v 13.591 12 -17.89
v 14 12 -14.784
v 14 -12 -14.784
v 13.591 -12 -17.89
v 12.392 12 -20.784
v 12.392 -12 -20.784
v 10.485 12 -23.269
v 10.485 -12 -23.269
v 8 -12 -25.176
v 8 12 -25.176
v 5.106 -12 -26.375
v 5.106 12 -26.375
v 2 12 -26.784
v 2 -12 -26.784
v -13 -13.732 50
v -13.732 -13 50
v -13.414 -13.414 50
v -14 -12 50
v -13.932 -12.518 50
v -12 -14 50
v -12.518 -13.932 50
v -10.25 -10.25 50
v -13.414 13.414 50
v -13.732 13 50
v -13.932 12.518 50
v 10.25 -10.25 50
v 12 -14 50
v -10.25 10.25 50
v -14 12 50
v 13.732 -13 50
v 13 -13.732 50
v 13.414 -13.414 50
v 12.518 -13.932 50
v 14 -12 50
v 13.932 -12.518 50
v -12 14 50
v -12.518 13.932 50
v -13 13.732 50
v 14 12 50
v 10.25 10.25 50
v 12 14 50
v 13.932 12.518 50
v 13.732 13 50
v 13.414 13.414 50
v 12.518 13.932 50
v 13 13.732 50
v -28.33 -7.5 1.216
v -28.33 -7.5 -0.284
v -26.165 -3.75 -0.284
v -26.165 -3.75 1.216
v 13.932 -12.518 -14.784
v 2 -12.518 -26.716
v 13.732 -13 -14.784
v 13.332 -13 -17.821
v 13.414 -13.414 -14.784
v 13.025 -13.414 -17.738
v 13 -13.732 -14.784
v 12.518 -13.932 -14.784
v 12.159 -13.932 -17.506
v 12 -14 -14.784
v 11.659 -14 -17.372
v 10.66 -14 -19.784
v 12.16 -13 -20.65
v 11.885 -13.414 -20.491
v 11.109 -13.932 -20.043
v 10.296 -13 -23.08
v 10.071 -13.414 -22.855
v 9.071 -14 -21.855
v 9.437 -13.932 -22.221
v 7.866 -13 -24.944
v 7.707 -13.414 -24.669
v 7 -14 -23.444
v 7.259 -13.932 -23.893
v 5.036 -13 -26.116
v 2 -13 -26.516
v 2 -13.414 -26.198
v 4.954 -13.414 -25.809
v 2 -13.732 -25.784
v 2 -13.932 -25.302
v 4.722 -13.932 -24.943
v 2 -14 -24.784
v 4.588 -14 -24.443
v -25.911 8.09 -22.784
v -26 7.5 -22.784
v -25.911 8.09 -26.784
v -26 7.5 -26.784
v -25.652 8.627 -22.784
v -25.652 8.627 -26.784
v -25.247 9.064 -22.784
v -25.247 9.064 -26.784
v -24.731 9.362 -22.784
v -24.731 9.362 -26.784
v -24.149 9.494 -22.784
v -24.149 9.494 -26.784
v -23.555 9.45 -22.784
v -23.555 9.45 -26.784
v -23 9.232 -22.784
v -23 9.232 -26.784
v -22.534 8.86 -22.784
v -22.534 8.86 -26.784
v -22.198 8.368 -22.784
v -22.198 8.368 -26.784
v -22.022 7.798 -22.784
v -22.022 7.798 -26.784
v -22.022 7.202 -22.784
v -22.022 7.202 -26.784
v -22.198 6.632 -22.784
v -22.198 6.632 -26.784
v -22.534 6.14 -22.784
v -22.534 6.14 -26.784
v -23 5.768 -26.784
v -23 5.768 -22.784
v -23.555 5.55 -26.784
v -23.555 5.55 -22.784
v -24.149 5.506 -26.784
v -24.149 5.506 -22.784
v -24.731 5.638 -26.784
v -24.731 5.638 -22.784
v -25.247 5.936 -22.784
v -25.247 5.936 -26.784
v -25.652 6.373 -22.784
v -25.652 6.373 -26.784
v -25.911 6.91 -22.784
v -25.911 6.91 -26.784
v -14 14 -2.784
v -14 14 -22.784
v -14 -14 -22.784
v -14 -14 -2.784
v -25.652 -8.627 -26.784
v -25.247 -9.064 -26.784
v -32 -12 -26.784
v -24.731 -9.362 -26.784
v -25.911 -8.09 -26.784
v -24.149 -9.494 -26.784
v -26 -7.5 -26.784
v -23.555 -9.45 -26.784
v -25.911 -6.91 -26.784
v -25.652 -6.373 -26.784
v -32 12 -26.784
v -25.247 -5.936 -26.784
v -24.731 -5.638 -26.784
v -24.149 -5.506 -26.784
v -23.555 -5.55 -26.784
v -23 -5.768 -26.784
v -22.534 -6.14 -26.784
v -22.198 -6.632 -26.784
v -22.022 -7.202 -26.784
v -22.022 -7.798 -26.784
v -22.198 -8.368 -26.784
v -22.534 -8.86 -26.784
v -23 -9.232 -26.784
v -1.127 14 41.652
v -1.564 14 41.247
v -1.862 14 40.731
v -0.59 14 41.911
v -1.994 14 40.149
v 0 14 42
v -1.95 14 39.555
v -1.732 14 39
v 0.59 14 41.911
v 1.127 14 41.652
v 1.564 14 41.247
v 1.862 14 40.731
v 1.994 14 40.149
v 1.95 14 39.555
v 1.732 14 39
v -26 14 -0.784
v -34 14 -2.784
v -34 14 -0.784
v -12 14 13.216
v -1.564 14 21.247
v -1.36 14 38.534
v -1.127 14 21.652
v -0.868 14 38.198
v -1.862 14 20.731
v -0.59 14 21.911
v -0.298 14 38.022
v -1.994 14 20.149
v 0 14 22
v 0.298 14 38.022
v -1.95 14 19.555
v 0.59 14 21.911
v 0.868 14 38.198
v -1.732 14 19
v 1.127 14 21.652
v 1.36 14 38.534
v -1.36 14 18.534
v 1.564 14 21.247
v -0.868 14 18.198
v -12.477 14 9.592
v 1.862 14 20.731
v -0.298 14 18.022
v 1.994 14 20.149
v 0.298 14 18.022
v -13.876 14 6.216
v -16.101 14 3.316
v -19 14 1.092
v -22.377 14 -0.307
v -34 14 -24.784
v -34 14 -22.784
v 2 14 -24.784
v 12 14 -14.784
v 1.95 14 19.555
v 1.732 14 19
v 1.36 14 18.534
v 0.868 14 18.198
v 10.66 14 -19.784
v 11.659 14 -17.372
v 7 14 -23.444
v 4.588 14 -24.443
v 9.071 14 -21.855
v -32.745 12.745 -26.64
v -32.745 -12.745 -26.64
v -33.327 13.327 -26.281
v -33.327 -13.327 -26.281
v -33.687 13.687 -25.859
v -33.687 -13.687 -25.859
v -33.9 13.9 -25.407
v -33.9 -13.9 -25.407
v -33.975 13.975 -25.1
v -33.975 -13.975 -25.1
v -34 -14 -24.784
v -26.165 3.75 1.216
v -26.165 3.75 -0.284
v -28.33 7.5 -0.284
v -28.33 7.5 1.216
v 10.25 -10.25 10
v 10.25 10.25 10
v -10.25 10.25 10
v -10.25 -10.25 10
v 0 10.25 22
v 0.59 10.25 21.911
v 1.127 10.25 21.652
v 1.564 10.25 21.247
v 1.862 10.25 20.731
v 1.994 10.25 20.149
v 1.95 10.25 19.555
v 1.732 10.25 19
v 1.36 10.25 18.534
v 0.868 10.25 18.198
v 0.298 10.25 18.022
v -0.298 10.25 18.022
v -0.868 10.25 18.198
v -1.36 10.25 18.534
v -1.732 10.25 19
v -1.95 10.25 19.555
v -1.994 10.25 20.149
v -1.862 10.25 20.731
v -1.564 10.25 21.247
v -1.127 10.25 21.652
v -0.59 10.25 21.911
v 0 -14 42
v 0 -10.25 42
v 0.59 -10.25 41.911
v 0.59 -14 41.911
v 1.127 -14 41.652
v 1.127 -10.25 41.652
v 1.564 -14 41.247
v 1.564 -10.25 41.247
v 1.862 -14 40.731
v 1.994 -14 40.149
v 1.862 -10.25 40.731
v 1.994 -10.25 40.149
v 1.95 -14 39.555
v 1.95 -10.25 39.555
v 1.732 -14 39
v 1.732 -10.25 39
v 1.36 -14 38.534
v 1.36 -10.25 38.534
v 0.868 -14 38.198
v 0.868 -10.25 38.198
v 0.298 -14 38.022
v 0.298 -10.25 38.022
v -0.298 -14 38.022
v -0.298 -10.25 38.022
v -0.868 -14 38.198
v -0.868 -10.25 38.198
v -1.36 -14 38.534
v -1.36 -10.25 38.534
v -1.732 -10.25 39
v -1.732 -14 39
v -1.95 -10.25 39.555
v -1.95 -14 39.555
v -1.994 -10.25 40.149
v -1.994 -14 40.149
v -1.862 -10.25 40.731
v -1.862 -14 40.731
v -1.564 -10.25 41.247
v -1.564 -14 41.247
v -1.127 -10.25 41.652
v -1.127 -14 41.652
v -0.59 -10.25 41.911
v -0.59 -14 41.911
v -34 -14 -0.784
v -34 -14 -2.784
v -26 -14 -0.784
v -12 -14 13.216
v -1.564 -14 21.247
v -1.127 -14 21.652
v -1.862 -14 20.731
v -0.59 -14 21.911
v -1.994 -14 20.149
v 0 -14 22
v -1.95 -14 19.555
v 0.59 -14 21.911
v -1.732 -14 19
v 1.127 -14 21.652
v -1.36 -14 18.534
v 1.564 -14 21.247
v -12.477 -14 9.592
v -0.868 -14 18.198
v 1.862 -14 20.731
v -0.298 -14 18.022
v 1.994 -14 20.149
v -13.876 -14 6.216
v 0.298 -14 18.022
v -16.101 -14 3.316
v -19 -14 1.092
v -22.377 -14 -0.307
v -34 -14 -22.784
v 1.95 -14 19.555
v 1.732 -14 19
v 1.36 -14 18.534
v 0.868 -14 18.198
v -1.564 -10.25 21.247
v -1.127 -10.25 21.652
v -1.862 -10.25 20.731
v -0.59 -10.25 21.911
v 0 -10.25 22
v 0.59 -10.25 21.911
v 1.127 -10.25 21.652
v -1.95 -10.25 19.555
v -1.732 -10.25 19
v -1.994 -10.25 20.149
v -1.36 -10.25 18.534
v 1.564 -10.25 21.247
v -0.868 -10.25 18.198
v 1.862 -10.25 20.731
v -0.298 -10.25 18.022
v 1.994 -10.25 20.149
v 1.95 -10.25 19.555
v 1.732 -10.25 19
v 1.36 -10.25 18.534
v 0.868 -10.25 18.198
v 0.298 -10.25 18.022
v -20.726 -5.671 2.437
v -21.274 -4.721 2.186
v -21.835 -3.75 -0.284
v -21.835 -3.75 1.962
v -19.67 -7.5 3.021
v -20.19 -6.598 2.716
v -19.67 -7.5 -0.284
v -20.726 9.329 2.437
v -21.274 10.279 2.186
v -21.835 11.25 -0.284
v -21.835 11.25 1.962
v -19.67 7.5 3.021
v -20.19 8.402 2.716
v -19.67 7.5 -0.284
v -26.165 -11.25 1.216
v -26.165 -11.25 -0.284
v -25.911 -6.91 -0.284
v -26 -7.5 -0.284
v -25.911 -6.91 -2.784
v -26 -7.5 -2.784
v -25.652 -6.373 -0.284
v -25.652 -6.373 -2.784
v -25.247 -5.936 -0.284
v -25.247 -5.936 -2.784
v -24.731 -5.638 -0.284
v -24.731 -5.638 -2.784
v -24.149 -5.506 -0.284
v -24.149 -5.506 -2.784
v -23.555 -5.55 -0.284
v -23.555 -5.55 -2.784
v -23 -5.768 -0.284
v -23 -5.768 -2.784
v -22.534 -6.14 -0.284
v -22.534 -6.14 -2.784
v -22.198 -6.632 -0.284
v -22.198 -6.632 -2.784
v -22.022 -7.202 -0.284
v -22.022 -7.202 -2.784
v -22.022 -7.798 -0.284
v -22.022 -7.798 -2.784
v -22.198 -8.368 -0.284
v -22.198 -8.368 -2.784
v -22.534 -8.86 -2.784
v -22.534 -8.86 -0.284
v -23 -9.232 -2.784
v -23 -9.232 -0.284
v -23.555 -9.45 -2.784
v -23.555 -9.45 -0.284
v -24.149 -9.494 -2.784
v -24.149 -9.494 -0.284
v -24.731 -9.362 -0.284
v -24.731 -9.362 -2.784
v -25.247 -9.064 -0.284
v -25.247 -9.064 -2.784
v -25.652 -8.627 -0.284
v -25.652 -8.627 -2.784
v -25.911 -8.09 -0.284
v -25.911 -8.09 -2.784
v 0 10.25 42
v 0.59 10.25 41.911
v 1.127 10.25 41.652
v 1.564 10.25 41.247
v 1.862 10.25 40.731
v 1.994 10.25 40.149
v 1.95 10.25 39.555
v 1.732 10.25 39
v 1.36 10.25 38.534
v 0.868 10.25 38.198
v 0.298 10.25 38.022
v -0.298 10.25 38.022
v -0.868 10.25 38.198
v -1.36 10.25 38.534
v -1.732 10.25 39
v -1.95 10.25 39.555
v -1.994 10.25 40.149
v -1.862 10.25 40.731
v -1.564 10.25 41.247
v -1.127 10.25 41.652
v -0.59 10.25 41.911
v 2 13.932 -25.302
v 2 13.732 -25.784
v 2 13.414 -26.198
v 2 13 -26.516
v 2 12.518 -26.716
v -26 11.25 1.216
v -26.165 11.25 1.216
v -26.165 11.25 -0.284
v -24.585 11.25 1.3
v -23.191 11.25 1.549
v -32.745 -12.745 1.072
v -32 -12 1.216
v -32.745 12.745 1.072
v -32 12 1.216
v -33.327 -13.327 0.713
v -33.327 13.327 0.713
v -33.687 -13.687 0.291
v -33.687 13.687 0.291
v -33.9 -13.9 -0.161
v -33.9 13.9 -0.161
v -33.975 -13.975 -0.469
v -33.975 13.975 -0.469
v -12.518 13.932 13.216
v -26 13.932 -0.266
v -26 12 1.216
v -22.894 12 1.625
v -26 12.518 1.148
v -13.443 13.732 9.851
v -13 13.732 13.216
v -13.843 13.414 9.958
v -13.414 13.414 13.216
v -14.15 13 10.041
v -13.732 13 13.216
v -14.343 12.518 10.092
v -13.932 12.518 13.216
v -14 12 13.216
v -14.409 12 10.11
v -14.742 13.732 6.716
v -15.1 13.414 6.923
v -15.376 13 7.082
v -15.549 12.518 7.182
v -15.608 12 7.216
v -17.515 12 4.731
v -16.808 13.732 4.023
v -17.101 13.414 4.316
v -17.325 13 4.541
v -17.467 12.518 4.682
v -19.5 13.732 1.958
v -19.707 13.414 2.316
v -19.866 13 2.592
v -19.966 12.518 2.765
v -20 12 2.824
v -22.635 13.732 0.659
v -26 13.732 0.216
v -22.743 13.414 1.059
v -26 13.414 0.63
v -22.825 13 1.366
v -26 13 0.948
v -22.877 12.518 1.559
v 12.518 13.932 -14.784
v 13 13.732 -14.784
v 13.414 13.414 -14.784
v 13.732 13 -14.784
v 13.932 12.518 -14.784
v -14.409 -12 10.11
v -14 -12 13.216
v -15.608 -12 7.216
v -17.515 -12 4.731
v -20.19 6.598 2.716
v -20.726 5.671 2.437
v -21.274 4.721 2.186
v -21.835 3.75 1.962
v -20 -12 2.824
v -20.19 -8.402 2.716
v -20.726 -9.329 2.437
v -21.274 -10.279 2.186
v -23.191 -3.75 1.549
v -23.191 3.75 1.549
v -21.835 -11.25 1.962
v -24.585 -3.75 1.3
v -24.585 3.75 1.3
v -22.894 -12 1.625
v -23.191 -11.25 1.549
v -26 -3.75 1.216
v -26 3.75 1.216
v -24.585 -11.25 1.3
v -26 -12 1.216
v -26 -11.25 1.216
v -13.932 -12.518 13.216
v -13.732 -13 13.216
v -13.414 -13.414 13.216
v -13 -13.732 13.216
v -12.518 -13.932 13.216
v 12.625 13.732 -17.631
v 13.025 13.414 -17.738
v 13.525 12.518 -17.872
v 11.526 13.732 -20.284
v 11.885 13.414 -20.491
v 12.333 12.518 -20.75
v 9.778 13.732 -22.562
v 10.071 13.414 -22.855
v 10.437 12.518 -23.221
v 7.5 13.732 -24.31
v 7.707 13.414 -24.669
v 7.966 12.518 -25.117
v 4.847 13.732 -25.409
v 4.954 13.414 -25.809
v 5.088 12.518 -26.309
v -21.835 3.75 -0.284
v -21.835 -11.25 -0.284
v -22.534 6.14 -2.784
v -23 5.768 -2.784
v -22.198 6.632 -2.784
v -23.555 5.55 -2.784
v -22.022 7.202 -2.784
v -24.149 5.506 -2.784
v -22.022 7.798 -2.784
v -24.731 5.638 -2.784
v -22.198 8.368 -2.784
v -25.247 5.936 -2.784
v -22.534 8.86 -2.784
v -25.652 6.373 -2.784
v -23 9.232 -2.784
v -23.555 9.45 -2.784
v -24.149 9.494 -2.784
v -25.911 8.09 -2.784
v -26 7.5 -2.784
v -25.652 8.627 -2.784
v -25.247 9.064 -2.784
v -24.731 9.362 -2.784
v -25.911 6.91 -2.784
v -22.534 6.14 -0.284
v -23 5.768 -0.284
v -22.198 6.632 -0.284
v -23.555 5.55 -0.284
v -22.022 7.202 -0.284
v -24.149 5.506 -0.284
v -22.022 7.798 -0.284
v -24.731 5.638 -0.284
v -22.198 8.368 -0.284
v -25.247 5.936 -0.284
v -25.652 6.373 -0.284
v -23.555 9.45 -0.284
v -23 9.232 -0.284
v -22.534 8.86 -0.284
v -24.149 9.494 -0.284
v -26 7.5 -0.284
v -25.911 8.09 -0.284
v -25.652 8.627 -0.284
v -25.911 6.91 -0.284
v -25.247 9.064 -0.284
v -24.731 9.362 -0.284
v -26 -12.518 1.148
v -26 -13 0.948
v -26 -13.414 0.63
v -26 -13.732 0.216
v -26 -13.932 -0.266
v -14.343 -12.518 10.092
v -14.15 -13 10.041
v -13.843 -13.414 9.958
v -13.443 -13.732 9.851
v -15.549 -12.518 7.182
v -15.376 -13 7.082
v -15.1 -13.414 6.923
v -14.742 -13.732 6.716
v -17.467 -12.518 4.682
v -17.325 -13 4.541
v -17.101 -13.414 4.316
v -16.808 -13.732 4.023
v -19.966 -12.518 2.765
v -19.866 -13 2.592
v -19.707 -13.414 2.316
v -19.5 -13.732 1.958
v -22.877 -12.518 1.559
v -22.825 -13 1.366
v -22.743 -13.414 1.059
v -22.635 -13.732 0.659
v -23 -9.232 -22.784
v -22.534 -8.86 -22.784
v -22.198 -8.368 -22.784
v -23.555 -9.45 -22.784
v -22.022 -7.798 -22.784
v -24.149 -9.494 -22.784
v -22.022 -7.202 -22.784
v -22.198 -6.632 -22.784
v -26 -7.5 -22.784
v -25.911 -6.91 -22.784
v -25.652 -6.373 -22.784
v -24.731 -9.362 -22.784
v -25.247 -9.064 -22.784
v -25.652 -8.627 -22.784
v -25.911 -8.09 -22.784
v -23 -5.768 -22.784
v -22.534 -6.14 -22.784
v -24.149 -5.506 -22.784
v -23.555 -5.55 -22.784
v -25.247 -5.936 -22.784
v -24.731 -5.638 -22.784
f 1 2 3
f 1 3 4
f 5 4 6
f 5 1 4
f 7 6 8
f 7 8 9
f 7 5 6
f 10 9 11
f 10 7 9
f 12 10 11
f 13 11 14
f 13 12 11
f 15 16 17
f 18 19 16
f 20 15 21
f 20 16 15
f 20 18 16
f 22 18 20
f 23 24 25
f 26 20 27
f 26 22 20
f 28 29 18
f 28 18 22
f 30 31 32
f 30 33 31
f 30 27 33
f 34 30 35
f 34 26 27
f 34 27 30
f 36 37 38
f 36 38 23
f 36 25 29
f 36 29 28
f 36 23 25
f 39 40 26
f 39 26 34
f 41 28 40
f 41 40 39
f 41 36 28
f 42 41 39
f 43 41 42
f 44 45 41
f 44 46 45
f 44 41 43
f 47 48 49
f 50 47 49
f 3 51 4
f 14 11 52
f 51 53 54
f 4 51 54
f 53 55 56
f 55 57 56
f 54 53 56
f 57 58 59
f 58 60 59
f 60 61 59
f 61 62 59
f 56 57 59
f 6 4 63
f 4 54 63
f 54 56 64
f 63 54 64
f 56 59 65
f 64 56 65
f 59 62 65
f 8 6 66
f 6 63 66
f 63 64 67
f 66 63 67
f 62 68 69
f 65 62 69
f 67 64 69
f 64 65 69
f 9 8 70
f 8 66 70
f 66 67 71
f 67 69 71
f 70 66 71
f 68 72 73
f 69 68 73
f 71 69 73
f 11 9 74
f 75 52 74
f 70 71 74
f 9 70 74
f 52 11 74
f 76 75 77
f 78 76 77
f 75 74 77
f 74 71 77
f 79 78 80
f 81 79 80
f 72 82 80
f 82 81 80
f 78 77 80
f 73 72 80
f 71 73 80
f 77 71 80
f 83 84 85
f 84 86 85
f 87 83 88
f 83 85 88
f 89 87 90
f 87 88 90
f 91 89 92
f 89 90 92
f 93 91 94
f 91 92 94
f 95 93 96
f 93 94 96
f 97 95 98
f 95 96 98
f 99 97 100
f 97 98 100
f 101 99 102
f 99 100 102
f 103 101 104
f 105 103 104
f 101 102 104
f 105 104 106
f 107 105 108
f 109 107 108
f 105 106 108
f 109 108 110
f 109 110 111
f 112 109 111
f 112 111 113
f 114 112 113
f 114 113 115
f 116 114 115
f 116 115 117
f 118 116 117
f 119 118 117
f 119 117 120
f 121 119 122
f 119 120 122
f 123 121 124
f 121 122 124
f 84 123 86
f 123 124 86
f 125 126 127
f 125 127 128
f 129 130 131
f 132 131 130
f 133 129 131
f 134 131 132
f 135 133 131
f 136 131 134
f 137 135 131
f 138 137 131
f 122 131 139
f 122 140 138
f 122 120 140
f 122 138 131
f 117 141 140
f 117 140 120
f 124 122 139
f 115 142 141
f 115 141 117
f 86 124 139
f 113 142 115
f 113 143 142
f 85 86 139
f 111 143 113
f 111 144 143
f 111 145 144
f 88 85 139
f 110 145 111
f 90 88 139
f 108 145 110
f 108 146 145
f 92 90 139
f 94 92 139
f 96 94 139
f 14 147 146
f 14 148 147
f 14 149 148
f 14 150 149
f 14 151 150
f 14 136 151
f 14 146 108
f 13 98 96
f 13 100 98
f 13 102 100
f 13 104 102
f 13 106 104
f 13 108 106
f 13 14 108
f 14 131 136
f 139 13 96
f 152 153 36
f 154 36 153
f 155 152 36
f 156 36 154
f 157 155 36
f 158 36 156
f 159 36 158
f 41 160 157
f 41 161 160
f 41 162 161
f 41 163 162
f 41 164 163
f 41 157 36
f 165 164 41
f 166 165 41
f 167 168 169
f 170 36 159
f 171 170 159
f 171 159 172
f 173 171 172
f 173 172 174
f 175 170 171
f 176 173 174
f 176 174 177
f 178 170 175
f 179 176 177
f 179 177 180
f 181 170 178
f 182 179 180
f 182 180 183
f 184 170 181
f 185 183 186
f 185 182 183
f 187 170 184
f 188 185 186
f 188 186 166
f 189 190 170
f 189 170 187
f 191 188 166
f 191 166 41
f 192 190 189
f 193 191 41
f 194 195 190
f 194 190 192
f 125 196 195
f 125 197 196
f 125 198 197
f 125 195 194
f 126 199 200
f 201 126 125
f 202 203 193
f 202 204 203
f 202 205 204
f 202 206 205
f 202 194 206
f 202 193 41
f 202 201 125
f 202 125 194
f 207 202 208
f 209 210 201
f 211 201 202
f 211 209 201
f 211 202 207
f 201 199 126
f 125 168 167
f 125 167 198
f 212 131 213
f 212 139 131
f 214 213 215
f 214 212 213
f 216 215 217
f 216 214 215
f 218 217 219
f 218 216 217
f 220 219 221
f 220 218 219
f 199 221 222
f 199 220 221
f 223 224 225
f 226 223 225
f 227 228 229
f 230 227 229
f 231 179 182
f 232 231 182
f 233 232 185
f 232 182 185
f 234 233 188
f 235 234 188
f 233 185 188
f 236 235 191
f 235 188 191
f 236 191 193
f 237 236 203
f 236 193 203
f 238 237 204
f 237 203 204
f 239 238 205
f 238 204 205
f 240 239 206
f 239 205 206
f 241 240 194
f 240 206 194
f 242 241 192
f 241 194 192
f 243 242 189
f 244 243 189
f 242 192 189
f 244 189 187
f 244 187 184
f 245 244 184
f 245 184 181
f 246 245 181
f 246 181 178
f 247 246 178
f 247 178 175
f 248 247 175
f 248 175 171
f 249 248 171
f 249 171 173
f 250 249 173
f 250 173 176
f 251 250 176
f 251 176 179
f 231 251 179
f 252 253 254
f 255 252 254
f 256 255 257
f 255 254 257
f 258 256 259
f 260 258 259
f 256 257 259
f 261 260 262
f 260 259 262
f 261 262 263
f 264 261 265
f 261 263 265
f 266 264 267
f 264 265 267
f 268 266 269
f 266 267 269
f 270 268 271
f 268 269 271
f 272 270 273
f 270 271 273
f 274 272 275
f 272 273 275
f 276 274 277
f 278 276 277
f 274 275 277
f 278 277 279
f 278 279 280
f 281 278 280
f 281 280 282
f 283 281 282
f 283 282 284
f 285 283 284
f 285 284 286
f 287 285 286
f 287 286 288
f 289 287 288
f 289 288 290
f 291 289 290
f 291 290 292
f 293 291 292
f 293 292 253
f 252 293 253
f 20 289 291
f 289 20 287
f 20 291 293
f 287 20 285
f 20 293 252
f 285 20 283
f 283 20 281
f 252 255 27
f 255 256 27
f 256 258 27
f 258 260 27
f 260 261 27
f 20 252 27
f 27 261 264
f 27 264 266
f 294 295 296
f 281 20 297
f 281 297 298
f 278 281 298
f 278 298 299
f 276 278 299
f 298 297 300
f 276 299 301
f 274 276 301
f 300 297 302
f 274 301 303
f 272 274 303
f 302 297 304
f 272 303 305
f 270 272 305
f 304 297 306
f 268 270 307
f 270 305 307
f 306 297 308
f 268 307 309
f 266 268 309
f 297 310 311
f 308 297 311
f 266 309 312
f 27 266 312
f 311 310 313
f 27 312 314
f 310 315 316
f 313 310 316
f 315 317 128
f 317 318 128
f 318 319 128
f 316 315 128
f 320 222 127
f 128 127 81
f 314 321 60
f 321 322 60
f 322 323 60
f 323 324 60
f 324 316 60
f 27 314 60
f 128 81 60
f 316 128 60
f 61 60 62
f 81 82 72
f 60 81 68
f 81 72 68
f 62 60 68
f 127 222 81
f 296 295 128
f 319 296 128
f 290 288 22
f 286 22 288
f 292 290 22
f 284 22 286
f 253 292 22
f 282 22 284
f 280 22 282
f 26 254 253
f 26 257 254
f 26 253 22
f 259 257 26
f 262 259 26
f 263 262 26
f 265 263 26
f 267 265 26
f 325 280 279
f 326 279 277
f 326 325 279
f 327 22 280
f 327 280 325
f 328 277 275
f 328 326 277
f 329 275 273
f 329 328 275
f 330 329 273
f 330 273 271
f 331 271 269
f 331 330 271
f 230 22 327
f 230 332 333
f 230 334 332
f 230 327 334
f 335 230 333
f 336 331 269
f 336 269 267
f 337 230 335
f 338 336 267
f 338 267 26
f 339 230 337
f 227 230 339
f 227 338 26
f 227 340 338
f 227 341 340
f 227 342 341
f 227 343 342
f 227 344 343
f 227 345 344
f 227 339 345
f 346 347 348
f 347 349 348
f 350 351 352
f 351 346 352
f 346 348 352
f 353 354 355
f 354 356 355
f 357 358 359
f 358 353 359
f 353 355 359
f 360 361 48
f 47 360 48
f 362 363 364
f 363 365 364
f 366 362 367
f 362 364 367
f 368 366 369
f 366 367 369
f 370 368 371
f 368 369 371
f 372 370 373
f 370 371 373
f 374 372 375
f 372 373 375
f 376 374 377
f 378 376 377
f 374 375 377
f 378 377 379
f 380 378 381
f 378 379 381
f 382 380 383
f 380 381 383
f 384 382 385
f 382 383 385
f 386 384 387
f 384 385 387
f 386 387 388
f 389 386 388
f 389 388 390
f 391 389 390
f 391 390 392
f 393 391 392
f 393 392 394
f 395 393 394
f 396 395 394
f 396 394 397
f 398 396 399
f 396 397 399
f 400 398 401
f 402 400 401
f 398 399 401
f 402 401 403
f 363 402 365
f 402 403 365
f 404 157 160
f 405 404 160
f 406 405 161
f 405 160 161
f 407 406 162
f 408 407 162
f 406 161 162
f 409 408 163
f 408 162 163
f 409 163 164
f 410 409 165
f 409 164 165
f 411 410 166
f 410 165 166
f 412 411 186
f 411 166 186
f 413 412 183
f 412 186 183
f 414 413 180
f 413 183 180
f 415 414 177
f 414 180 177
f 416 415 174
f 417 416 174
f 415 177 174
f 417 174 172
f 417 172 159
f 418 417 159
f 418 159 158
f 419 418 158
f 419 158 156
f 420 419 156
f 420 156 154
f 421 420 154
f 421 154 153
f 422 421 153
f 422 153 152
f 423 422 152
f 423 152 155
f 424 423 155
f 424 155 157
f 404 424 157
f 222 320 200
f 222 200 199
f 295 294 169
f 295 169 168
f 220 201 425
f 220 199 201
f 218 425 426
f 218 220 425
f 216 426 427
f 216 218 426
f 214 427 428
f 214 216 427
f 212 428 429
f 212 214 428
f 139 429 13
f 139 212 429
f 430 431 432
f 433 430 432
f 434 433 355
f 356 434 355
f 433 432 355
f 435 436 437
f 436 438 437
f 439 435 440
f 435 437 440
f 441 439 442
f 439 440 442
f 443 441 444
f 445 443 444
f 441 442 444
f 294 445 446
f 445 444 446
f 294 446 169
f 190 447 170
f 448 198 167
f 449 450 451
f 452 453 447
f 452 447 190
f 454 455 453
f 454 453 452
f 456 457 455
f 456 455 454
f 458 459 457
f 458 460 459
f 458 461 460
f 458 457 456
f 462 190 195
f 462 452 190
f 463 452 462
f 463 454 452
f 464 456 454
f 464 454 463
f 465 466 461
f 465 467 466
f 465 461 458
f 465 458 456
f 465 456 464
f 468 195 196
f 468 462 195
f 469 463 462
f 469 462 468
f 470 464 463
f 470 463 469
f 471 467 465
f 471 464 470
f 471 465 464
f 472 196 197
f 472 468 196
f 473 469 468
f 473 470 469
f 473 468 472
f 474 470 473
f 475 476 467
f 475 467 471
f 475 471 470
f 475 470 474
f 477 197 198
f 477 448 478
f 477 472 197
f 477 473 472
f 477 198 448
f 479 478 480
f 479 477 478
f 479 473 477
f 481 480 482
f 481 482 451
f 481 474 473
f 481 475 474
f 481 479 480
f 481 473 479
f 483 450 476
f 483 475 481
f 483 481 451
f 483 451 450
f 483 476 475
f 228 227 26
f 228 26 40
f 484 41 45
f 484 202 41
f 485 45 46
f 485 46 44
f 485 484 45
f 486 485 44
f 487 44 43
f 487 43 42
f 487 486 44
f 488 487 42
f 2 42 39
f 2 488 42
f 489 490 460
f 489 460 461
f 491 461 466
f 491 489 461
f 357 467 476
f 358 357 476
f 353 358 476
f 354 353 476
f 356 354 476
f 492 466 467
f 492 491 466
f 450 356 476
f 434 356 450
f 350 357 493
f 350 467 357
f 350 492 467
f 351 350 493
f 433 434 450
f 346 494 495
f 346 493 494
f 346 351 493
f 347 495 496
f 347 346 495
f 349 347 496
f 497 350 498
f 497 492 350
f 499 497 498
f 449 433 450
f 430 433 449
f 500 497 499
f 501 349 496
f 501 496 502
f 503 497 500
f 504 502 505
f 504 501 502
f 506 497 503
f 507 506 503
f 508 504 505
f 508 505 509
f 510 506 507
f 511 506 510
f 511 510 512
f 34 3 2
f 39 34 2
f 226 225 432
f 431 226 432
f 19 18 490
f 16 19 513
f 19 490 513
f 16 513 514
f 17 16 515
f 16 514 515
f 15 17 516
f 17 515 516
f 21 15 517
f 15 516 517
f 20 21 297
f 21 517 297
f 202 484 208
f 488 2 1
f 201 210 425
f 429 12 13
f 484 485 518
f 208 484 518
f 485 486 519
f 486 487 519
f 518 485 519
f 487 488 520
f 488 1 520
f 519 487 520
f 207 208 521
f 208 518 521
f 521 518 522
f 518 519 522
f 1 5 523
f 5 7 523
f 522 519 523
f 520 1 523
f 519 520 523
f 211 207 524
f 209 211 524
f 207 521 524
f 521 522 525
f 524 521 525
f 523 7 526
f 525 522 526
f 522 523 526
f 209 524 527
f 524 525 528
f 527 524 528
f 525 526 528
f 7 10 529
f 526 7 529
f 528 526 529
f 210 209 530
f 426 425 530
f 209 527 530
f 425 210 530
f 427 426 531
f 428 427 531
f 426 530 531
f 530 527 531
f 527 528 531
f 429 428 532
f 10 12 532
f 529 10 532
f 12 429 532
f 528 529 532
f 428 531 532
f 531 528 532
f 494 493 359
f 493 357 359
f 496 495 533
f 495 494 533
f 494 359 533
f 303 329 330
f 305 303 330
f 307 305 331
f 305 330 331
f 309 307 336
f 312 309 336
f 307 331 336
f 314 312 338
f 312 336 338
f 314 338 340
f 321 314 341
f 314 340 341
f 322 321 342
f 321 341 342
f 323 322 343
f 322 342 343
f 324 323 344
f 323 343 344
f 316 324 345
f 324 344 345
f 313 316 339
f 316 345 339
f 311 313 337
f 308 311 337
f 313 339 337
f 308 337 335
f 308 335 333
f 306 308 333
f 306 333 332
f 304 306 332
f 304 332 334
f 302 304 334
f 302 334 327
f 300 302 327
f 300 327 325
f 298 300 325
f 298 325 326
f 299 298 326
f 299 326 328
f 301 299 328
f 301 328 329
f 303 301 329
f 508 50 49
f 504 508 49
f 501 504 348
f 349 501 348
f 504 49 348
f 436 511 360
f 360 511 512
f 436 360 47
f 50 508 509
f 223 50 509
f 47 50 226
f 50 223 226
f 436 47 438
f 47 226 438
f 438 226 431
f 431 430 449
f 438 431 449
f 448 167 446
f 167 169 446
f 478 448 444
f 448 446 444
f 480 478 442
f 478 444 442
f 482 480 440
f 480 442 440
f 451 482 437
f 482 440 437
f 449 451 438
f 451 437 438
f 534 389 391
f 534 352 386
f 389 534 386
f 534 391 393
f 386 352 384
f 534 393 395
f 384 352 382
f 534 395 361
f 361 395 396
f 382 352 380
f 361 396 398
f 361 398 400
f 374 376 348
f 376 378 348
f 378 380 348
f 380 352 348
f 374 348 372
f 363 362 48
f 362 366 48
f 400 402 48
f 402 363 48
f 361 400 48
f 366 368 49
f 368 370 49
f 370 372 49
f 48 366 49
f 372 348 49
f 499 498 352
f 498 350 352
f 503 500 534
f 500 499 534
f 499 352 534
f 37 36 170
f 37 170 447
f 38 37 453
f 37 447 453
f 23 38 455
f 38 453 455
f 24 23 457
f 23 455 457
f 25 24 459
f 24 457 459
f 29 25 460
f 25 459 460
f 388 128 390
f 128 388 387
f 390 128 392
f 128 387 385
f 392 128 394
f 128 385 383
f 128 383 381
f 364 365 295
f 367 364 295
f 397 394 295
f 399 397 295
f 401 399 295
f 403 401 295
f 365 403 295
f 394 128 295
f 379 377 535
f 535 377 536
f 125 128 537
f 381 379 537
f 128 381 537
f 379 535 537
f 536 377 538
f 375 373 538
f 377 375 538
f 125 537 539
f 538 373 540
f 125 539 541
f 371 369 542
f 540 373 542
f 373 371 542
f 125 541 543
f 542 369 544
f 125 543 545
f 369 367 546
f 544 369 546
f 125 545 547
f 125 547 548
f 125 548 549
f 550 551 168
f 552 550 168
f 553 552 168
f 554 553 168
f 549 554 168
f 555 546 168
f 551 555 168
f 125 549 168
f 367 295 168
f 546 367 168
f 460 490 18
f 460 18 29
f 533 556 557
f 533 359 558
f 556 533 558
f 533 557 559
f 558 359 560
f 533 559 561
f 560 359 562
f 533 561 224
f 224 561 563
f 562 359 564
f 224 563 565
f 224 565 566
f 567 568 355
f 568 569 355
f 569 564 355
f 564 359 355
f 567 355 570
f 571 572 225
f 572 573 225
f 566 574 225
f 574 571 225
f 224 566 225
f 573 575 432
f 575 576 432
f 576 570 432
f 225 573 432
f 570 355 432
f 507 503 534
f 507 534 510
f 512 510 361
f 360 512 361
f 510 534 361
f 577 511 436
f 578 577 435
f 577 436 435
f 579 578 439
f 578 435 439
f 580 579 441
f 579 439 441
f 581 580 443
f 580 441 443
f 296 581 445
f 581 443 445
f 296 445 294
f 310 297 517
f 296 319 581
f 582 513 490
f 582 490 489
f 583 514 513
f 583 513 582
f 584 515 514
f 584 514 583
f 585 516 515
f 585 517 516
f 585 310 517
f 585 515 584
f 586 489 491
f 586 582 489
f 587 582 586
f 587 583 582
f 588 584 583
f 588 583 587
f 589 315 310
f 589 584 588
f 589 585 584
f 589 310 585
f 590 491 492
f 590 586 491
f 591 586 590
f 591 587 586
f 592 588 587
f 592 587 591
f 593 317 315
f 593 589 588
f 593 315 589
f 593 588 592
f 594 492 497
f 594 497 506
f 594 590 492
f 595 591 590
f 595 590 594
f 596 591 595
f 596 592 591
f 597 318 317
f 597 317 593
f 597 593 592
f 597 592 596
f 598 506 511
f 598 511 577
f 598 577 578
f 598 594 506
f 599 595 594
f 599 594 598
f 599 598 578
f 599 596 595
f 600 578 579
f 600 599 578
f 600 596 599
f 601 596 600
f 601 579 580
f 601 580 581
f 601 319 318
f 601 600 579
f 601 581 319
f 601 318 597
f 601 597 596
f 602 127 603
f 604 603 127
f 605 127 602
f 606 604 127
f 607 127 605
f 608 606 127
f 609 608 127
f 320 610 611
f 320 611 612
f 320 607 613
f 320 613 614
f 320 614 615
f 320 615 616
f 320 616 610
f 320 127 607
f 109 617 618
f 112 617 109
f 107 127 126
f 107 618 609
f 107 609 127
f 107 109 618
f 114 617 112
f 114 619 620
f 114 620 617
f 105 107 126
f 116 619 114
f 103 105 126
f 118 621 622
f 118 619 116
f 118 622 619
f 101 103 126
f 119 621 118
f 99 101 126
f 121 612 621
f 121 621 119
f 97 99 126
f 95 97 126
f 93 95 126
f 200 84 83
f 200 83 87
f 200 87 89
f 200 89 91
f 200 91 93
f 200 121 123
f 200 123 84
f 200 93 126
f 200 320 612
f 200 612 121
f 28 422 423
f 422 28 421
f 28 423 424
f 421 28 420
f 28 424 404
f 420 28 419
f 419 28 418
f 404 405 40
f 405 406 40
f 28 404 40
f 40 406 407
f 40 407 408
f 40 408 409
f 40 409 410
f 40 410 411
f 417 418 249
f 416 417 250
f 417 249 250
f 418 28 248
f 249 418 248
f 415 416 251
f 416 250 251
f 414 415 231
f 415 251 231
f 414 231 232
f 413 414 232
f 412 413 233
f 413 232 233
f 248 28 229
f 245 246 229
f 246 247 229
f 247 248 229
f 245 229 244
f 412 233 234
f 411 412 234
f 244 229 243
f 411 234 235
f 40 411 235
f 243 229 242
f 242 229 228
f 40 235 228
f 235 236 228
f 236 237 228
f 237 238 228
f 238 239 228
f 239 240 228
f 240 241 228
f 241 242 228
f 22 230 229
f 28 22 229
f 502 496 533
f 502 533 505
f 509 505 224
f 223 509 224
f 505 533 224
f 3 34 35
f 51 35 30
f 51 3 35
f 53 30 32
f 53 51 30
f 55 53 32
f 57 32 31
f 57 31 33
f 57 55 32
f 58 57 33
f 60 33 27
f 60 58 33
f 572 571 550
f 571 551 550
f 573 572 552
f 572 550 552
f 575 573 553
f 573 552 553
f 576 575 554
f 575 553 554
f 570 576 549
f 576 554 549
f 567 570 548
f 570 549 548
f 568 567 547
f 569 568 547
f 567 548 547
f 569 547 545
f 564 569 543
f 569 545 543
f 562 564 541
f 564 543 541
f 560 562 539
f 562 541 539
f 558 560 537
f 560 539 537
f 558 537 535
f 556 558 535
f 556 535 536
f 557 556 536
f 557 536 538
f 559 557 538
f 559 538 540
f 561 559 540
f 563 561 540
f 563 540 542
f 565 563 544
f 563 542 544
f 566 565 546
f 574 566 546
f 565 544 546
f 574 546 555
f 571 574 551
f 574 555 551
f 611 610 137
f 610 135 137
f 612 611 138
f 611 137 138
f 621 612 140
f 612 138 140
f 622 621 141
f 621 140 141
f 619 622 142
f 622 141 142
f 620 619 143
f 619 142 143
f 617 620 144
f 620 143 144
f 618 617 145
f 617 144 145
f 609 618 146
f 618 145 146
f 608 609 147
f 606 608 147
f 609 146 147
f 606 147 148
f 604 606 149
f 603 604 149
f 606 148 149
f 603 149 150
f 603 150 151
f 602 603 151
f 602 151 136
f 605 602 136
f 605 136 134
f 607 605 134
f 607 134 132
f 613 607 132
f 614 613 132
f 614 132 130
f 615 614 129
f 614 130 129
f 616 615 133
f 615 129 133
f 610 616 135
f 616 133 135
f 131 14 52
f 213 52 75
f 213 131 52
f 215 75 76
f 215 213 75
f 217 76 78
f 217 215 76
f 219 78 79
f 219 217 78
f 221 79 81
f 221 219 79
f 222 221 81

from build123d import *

# Parameters (mm, degrees)
SKETCH_1_W          = 28
SKETCH_1_H          = 28
SKETCH_1_W_2        = 20.5
SKETCH_1_H_2        = 20.5
EXTRUDE_1_DEPTH     = 50
SKETCH_2_W          = 28
SKETCH_2_H          = 28
EXTRUDE_2_DEPTH     = 10
SKETCH_7_W          = 28
SKETCH_7_H          = 28
EXTRUDE_4_DEPTH     = 48
SKETCH_8_W          = 20
SKETCH_8_H          = 28
CUT_EXTRUDE_4_DEPTH = 20
FILLET_4_R          = 12
FILLET_6_R          = 2
SKETCH_9_R          = 2
CUT_EXTRUDE_5_DEPTH = 86.134031464
CUT_EXTRUDE_START   = -26.5
CUT_EXTRUDE_6_DEPTH = 59.634031464
SKETCH_12_R         = 2
CUT_EXTRUDE_7_DEPTH = 67.633324996


with BuildPart() as part:
    # 草图1 → 凸台-拉伸1 (new body)
    with BuildSketch(Plane.XY):
        Rectangle(SKETCH_1_W, SKETCH_1_H)
        Rectangle(SKETCH_1_W_2, SKETCH_1_H_2, mode=Mode.SUBTRACT)
    extrude(amount=EXTRUDE_1_DEPTH)

    # 草图2 → 凸台-拉伸2 (add)
    with BuildSketch(Plane(origin=(0, 0, 0), x_dir=(-1, 0, 0), z_dir=(0, 0, -1))):
        Rectangle(SKETCH_2_W, SKETCH_2_H)
    extrude(amount=-EXTRUDE_2_DEPTH)

    # 草图7 → 凸台-拉伸4 (add)
    with BuildSketch(Plane(origin=(14, 0, 0), x_dir=(0, 0, -1), z_dir=(1, 0, 0))):
        with Locations((12.784134516, 0)):
            Rectangle(SKETCH_7_W, SKETCH_7_H)
    extrude(amount=-EXTRUDE_4_DEPTH)

    # 草图8 → 切除-拉伸4 (cut)
    with BuildSketch(Plane.ZY.offset(34)):
        with Locations((-12.784134516, 0)):
            Rectangle(SKETCH_8_W, SKETCH_8_H)
    extrude(amount=-CUT_EXTRUDE_4_DEPTH, mode=Mode.SUBTRACT)

    # 圆角4
    fillet_4_edges = [part.edges().sort_by_distance(p)[0] for p in [
        (-14, 0, 1.215865484),
        (14, 0, -26.784134516),
    ]]
    fillet(fillet_4_edges, radius=FILLET_4_R)

    # 圆角6
    fillet_6_edges = [part.edges().sort_by_distance(p)[0] for p in [
        (-34, 0, 1.215865484),
        (-30, -14, 1.215865484),
        (-30, 14, 1.215865484),
        (-34, 0, -26.784134516),
        (-16, 14, -26.784134516),
        (-16, -14, -26.784134516),
        (14, -14, 17.607932742),
        (-14, -14, 31.607932742),
        (-14, 14, 31.607932742),
        (14, 14, 17.607932742),
        (10.485281374, 14, -23.26941589),
        (10.485281374, -14, -23.26941589),
        (-17.514718626, -14, 4.73058411),
        (-17.514718626, 14, 4.73058411),
    ]]
    fillet(fillet_6_edges, radius=FILLET_6_R)

    # 草图9 → 切除-拉伸5 (cut, through all)
    with BuildSketch(Plane(origin=(0, 0, -26.784134516), x_dir=(-1, 0, 0), z_dir=(0, 0, -1))):
        with Locations((24, 7.5)):
            Circle(SKETCH_9_R)
        with Locations((24, -7.5)):
            Circle(SKETCH_9_R)
    extrude(amount=-CUT_EXTRUDE_5_DEPTH, mode=Mode.SUBTRACT)

    # 草图10 → 切除-拉伸6 (cut, through all)
    with BuildSketch(Plane(origin=(0, 0, -26.784134516), x_dir=(-1, 0, 0), z_dir=(0, 0, -1)).offset(CUT_EXTRUDE_START)):
        Polygon((19.669872981, 7.5), (21.834936491, 3.75), (26.165063509, 3.75), (28.330127019, 7.5), (26.165063509, 11.25), (21.834936491, 11.25), align=None)
        Polygon((19.669872981, -7.5), (21.834936491, -11.25), (26.165063509, -11.25), (28.330127019, -7.5), (26.165063509, -3.75), (21.834936491, -3.75), align=None)
    extrude(amount=-CUT_EXTRUDE_6_DEPTH, mode=Mode.SUBTRACT)

    # 草图12 → 切除-拉伸7 (cut, through all)
    with BuildSketch(Plane(origin=(0, 14, 0), x_dir=(1, 0, 0), z_dir=(0, 1, 0))):
        with Locations(Location((0, -40, 0), (0, 0, 270))):
            Circle(SKETCH_12_R)
        with Locations(Location((0, -20, 0), (0, 0, 270))):
            Circle(SKETCH_12_R)
    extrude(amount=-CUT_EXTRUDE_7_DEPTH, mode=Mode.SUBTRACT)


solid = part.part
